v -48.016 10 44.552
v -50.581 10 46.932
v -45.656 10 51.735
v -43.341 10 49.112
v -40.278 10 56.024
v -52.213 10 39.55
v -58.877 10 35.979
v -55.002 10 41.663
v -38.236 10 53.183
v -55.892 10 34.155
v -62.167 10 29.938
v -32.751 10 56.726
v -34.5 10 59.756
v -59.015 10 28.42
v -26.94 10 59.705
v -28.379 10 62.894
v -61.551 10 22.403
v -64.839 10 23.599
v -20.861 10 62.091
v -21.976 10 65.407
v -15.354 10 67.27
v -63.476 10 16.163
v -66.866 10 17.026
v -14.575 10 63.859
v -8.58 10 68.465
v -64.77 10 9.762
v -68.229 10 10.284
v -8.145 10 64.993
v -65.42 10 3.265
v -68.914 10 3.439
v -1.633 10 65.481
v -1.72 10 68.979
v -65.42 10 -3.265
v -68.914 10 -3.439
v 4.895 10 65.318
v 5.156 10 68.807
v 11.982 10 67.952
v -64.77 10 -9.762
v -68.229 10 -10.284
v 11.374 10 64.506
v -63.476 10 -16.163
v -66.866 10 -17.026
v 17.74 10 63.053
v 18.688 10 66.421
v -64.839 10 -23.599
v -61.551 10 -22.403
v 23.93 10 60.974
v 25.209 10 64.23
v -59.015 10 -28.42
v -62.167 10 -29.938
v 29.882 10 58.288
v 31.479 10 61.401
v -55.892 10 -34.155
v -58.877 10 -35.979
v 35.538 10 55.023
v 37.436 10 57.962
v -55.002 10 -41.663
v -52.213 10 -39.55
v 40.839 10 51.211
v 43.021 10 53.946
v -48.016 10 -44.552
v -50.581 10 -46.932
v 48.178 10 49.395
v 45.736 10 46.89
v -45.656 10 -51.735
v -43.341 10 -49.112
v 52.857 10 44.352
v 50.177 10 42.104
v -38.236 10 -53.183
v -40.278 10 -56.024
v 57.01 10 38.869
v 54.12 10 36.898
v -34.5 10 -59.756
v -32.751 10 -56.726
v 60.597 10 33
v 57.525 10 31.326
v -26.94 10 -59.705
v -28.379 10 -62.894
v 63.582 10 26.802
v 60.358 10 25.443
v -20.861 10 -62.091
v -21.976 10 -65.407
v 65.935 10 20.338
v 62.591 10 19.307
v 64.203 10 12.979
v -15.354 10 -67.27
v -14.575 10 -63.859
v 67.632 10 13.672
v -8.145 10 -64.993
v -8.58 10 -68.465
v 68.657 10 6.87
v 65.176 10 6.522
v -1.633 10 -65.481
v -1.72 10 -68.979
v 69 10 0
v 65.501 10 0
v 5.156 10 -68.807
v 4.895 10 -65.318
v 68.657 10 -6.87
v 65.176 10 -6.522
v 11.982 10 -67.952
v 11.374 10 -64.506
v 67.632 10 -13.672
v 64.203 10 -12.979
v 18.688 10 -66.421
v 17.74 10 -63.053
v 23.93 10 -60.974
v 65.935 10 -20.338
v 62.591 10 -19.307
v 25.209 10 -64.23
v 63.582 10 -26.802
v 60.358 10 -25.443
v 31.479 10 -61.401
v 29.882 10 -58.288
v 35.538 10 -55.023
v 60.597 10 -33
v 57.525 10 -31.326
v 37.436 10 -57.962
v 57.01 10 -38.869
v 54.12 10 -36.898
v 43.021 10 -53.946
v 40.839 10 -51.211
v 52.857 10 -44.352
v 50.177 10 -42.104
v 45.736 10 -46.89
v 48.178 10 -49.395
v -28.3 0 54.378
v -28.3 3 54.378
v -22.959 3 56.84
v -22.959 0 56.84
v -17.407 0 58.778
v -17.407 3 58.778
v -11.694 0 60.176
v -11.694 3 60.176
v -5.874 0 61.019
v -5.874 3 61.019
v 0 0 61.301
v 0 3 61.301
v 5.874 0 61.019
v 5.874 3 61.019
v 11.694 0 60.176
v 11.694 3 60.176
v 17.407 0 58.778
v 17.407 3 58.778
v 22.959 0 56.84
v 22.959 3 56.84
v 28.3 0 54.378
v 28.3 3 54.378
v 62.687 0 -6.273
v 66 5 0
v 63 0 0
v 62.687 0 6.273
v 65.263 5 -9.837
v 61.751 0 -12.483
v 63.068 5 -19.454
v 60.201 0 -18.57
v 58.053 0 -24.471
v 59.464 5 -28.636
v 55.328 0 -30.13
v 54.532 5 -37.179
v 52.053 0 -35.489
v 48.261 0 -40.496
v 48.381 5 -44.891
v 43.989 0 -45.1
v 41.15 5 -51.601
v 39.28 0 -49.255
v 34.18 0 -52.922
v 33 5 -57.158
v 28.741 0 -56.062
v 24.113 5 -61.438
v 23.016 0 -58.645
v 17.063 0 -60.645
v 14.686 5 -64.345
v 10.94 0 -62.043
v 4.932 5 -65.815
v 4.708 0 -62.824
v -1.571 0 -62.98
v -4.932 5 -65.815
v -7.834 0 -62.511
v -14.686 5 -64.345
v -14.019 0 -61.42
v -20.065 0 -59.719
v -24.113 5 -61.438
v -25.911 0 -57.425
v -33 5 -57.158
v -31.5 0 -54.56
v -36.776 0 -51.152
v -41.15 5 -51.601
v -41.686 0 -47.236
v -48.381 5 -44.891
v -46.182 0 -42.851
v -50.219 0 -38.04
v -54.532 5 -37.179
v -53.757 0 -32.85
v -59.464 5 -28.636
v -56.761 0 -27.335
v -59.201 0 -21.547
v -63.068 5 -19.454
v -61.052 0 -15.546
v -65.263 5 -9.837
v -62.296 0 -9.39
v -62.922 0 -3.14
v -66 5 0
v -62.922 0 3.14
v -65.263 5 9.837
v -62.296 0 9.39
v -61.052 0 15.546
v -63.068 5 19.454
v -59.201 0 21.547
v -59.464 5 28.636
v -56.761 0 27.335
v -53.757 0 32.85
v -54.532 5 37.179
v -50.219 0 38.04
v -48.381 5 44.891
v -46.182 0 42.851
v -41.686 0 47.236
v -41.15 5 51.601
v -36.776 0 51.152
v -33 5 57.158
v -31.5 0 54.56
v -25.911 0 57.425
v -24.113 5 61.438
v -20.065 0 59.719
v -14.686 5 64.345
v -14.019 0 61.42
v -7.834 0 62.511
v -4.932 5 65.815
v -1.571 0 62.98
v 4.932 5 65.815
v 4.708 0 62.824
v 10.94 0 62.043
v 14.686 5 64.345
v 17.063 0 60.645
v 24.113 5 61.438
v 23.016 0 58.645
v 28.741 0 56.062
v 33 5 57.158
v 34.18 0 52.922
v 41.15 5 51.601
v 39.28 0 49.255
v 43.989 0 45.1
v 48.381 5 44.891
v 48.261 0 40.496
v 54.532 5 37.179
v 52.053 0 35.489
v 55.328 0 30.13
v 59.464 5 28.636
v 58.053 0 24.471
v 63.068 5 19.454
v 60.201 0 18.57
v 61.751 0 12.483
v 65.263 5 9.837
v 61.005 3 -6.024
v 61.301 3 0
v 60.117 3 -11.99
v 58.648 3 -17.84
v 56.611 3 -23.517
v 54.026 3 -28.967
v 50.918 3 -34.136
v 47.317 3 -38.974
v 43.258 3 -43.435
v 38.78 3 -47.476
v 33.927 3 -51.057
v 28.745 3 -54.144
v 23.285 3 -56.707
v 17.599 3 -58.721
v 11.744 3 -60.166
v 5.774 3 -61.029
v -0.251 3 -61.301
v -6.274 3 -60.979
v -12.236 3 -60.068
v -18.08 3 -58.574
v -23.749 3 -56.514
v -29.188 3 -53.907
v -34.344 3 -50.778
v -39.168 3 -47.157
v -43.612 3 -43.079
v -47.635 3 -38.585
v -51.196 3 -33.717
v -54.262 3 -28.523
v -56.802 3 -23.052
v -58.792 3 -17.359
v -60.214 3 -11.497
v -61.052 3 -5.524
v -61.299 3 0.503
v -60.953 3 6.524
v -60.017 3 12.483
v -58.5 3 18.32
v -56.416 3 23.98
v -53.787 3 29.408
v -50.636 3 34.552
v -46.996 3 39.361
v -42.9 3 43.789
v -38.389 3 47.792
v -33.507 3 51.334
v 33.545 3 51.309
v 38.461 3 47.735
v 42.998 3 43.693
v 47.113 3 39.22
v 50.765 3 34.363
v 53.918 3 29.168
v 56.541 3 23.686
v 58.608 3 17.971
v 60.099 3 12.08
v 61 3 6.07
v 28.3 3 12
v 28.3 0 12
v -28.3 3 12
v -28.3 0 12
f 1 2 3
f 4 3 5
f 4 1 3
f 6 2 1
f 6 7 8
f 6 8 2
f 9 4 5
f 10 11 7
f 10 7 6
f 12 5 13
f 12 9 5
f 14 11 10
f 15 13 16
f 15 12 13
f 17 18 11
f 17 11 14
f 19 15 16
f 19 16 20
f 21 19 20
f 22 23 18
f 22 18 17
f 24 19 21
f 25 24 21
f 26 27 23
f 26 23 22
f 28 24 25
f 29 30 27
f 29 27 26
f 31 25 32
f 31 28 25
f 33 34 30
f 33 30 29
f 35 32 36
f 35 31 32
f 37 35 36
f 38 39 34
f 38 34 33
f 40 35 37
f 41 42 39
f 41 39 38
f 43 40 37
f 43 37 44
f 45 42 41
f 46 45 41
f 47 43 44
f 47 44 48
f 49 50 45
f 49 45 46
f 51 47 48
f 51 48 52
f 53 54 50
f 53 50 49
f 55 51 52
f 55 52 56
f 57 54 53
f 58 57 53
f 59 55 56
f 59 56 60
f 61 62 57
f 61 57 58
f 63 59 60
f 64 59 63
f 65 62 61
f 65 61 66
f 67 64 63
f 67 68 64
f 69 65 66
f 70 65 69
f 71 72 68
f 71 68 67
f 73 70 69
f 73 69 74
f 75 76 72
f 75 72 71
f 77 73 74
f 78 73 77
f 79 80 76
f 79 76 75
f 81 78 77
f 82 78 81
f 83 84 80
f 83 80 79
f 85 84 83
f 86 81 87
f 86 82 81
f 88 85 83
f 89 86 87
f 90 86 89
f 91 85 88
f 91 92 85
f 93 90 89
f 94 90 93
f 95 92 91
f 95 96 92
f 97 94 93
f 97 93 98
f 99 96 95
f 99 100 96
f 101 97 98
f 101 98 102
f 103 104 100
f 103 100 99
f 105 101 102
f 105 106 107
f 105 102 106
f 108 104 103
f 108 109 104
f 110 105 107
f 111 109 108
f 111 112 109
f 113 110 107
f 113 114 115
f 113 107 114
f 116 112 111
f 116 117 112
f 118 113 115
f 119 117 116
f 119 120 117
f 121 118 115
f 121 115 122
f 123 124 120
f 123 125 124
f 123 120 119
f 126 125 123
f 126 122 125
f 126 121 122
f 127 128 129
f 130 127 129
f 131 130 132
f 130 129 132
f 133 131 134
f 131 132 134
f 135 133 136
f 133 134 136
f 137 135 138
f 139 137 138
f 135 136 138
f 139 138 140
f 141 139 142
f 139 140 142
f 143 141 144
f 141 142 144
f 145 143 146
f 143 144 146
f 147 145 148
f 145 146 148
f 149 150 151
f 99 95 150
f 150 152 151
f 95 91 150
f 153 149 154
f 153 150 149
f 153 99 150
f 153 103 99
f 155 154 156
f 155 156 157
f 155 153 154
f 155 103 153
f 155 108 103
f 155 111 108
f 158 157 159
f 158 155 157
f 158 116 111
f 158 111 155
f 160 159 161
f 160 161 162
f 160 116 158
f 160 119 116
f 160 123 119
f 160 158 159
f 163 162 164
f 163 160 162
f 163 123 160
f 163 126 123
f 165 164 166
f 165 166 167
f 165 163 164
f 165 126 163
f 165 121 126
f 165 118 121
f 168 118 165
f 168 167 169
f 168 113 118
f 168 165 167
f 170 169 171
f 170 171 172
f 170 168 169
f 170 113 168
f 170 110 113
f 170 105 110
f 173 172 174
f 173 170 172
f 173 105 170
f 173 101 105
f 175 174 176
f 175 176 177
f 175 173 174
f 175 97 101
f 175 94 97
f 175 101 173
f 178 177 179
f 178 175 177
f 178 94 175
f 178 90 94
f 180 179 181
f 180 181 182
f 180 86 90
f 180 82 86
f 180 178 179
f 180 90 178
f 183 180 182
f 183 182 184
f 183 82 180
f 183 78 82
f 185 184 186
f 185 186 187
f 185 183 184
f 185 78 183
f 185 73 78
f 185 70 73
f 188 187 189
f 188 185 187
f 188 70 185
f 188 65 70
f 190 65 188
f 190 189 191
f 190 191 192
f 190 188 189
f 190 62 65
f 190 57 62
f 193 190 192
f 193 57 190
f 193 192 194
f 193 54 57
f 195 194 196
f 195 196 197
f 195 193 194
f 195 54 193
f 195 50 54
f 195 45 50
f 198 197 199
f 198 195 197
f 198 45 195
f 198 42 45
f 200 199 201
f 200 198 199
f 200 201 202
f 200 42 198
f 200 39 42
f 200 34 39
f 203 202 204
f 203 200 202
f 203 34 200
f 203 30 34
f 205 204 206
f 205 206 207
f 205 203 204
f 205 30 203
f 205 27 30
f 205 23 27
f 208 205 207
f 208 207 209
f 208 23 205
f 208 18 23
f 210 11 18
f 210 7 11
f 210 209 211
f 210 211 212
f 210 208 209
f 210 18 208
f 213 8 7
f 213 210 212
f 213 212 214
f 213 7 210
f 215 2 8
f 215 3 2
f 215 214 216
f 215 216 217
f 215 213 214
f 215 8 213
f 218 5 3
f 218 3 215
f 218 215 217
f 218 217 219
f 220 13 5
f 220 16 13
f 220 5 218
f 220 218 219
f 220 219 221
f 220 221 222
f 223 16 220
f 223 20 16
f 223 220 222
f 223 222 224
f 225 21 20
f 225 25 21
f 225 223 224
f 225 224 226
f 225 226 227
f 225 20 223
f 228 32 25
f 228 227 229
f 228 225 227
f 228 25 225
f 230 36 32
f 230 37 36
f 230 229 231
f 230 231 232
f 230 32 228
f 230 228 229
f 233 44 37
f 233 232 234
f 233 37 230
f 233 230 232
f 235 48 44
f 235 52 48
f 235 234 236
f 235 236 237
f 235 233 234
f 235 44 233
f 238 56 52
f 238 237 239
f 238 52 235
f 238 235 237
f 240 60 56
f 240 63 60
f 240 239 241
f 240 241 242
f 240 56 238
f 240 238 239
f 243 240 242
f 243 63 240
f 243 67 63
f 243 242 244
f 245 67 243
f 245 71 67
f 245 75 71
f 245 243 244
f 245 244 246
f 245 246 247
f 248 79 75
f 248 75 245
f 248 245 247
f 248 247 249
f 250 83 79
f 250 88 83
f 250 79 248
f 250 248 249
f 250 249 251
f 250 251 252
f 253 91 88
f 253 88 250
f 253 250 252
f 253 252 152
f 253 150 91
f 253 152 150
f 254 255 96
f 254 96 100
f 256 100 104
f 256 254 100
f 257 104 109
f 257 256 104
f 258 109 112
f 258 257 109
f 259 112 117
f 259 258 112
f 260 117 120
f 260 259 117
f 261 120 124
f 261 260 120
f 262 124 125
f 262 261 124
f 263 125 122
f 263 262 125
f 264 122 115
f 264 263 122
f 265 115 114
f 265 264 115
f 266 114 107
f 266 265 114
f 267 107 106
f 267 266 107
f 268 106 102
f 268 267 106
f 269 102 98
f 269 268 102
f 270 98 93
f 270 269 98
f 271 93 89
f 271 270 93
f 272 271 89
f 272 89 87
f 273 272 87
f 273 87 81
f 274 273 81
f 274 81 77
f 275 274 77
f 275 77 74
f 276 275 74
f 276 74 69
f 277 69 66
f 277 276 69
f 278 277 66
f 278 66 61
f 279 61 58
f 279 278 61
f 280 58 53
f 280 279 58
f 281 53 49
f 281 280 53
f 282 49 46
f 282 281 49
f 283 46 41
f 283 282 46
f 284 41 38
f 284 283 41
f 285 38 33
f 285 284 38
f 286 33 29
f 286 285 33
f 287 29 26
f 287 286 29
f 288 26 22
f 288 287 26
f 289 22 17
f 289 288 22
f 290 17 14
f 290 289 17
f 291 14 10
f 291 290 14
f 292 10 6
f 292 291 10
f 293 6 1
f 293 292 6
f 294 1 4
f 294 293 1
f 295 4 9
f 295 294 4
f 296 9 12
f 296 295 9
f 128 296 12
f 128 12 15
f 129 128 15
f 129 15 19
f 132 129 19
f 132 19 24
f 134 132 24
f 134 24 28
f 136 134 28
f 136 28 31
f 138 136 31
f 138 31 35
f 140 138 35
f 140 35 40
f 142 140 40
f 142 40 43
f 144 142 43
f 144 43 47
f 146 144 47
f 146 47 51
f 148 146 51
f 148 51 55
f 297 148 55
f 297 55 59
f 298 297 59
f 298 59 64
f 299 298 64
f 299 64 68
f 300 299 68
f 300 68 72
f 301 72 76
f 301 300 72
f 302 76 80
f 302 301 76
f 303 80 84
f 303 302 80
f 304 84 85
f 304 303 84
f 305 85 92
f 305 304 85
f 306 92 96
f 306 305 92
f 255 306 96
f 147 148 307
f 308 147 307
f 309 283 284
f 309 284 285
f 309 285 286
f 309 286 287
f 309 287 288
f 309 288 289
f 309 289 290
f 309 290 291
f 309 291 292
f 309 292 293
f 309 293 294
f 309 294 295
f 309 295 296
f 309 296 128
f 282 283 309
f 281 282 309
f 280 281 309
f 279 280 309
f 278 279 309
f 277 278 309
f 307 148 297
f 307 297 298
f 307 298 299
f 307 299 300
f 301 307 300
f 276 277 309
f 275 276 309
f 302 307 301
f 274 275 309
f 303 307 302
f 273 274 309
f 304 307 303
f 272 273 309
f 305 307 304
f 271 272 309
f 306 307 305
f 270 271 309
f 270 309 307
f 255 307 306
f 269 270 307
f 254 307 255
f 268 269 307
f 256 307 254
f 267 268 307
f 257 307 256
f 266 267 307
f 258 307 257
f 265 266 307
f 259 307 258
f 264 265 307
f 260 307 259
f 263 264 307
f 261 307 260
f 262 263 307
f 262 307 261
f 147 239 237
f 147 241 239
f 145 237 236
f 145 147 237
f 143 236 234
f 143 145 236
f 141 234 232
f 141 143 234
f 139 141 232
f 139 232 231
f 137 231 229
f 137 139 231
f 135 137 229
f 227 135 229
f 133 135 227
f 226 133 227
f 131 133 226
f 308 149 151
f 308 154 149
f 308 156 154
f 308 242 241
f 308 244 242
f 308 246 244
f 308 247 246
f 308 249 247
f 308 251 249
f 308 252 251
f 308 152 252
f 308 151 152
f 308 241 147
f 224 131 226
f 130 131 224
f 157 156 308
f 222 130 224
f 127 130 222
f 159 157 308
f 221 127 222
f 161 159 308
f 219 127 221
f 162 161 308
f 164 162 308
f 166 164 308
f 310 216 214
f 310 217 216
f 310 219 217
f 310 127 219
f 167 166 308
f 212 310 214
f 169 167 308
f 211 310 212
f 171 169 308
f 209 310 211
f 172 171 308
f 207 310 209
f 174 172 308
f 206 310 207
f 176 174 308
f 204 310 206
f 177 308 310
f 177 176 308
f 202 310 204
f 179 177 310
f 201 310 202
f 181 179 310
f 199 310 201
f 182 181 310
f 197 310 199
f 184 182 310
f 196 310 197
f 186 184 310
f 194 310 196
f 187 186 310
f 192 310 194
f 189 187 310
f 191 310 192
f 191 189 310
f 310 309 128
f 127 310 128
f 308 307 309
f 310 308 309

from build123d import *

# Parameters (mm, degrees)
CUT_EXTRUDE1_DEPTH = 4


with BuildPart() as part:
    # Sketch1 → Revolve1 (revolve)
    with BuildSketch(Plane.XY):
        Polygon((0, 0), (63, 0), (69, 10), (65.501428863, 10), (61.301428863, 3), (0, 3), align=None)
    revolve(axis=Axis((0, 0, 0), (0, 1, 0)))

    # Sketch2 → Cut-Extrude1 (cut, through all)
    with BuildSketch(Plane(origin=(0, 3, 0), x_dir=(1, 0, 0), z_dir=(0, 1, 0))):
        with BuildLine():
            Line((-28.3, -12), (-28.3, -54.378076287))
            ThreePointArc((-28.3, -54.378076287), (0, -61.301428863), (28.3, -54.378076287))
            Line((28.3, -54.378076287), (28.3, -12))
            Line((28.3, -12), (-28.3, -12))
        make_face()
    extrude(amount=-CUT_EXTRUDE1_DEPTH, mode=Mode.SUBTRACT)


solid = part.part
